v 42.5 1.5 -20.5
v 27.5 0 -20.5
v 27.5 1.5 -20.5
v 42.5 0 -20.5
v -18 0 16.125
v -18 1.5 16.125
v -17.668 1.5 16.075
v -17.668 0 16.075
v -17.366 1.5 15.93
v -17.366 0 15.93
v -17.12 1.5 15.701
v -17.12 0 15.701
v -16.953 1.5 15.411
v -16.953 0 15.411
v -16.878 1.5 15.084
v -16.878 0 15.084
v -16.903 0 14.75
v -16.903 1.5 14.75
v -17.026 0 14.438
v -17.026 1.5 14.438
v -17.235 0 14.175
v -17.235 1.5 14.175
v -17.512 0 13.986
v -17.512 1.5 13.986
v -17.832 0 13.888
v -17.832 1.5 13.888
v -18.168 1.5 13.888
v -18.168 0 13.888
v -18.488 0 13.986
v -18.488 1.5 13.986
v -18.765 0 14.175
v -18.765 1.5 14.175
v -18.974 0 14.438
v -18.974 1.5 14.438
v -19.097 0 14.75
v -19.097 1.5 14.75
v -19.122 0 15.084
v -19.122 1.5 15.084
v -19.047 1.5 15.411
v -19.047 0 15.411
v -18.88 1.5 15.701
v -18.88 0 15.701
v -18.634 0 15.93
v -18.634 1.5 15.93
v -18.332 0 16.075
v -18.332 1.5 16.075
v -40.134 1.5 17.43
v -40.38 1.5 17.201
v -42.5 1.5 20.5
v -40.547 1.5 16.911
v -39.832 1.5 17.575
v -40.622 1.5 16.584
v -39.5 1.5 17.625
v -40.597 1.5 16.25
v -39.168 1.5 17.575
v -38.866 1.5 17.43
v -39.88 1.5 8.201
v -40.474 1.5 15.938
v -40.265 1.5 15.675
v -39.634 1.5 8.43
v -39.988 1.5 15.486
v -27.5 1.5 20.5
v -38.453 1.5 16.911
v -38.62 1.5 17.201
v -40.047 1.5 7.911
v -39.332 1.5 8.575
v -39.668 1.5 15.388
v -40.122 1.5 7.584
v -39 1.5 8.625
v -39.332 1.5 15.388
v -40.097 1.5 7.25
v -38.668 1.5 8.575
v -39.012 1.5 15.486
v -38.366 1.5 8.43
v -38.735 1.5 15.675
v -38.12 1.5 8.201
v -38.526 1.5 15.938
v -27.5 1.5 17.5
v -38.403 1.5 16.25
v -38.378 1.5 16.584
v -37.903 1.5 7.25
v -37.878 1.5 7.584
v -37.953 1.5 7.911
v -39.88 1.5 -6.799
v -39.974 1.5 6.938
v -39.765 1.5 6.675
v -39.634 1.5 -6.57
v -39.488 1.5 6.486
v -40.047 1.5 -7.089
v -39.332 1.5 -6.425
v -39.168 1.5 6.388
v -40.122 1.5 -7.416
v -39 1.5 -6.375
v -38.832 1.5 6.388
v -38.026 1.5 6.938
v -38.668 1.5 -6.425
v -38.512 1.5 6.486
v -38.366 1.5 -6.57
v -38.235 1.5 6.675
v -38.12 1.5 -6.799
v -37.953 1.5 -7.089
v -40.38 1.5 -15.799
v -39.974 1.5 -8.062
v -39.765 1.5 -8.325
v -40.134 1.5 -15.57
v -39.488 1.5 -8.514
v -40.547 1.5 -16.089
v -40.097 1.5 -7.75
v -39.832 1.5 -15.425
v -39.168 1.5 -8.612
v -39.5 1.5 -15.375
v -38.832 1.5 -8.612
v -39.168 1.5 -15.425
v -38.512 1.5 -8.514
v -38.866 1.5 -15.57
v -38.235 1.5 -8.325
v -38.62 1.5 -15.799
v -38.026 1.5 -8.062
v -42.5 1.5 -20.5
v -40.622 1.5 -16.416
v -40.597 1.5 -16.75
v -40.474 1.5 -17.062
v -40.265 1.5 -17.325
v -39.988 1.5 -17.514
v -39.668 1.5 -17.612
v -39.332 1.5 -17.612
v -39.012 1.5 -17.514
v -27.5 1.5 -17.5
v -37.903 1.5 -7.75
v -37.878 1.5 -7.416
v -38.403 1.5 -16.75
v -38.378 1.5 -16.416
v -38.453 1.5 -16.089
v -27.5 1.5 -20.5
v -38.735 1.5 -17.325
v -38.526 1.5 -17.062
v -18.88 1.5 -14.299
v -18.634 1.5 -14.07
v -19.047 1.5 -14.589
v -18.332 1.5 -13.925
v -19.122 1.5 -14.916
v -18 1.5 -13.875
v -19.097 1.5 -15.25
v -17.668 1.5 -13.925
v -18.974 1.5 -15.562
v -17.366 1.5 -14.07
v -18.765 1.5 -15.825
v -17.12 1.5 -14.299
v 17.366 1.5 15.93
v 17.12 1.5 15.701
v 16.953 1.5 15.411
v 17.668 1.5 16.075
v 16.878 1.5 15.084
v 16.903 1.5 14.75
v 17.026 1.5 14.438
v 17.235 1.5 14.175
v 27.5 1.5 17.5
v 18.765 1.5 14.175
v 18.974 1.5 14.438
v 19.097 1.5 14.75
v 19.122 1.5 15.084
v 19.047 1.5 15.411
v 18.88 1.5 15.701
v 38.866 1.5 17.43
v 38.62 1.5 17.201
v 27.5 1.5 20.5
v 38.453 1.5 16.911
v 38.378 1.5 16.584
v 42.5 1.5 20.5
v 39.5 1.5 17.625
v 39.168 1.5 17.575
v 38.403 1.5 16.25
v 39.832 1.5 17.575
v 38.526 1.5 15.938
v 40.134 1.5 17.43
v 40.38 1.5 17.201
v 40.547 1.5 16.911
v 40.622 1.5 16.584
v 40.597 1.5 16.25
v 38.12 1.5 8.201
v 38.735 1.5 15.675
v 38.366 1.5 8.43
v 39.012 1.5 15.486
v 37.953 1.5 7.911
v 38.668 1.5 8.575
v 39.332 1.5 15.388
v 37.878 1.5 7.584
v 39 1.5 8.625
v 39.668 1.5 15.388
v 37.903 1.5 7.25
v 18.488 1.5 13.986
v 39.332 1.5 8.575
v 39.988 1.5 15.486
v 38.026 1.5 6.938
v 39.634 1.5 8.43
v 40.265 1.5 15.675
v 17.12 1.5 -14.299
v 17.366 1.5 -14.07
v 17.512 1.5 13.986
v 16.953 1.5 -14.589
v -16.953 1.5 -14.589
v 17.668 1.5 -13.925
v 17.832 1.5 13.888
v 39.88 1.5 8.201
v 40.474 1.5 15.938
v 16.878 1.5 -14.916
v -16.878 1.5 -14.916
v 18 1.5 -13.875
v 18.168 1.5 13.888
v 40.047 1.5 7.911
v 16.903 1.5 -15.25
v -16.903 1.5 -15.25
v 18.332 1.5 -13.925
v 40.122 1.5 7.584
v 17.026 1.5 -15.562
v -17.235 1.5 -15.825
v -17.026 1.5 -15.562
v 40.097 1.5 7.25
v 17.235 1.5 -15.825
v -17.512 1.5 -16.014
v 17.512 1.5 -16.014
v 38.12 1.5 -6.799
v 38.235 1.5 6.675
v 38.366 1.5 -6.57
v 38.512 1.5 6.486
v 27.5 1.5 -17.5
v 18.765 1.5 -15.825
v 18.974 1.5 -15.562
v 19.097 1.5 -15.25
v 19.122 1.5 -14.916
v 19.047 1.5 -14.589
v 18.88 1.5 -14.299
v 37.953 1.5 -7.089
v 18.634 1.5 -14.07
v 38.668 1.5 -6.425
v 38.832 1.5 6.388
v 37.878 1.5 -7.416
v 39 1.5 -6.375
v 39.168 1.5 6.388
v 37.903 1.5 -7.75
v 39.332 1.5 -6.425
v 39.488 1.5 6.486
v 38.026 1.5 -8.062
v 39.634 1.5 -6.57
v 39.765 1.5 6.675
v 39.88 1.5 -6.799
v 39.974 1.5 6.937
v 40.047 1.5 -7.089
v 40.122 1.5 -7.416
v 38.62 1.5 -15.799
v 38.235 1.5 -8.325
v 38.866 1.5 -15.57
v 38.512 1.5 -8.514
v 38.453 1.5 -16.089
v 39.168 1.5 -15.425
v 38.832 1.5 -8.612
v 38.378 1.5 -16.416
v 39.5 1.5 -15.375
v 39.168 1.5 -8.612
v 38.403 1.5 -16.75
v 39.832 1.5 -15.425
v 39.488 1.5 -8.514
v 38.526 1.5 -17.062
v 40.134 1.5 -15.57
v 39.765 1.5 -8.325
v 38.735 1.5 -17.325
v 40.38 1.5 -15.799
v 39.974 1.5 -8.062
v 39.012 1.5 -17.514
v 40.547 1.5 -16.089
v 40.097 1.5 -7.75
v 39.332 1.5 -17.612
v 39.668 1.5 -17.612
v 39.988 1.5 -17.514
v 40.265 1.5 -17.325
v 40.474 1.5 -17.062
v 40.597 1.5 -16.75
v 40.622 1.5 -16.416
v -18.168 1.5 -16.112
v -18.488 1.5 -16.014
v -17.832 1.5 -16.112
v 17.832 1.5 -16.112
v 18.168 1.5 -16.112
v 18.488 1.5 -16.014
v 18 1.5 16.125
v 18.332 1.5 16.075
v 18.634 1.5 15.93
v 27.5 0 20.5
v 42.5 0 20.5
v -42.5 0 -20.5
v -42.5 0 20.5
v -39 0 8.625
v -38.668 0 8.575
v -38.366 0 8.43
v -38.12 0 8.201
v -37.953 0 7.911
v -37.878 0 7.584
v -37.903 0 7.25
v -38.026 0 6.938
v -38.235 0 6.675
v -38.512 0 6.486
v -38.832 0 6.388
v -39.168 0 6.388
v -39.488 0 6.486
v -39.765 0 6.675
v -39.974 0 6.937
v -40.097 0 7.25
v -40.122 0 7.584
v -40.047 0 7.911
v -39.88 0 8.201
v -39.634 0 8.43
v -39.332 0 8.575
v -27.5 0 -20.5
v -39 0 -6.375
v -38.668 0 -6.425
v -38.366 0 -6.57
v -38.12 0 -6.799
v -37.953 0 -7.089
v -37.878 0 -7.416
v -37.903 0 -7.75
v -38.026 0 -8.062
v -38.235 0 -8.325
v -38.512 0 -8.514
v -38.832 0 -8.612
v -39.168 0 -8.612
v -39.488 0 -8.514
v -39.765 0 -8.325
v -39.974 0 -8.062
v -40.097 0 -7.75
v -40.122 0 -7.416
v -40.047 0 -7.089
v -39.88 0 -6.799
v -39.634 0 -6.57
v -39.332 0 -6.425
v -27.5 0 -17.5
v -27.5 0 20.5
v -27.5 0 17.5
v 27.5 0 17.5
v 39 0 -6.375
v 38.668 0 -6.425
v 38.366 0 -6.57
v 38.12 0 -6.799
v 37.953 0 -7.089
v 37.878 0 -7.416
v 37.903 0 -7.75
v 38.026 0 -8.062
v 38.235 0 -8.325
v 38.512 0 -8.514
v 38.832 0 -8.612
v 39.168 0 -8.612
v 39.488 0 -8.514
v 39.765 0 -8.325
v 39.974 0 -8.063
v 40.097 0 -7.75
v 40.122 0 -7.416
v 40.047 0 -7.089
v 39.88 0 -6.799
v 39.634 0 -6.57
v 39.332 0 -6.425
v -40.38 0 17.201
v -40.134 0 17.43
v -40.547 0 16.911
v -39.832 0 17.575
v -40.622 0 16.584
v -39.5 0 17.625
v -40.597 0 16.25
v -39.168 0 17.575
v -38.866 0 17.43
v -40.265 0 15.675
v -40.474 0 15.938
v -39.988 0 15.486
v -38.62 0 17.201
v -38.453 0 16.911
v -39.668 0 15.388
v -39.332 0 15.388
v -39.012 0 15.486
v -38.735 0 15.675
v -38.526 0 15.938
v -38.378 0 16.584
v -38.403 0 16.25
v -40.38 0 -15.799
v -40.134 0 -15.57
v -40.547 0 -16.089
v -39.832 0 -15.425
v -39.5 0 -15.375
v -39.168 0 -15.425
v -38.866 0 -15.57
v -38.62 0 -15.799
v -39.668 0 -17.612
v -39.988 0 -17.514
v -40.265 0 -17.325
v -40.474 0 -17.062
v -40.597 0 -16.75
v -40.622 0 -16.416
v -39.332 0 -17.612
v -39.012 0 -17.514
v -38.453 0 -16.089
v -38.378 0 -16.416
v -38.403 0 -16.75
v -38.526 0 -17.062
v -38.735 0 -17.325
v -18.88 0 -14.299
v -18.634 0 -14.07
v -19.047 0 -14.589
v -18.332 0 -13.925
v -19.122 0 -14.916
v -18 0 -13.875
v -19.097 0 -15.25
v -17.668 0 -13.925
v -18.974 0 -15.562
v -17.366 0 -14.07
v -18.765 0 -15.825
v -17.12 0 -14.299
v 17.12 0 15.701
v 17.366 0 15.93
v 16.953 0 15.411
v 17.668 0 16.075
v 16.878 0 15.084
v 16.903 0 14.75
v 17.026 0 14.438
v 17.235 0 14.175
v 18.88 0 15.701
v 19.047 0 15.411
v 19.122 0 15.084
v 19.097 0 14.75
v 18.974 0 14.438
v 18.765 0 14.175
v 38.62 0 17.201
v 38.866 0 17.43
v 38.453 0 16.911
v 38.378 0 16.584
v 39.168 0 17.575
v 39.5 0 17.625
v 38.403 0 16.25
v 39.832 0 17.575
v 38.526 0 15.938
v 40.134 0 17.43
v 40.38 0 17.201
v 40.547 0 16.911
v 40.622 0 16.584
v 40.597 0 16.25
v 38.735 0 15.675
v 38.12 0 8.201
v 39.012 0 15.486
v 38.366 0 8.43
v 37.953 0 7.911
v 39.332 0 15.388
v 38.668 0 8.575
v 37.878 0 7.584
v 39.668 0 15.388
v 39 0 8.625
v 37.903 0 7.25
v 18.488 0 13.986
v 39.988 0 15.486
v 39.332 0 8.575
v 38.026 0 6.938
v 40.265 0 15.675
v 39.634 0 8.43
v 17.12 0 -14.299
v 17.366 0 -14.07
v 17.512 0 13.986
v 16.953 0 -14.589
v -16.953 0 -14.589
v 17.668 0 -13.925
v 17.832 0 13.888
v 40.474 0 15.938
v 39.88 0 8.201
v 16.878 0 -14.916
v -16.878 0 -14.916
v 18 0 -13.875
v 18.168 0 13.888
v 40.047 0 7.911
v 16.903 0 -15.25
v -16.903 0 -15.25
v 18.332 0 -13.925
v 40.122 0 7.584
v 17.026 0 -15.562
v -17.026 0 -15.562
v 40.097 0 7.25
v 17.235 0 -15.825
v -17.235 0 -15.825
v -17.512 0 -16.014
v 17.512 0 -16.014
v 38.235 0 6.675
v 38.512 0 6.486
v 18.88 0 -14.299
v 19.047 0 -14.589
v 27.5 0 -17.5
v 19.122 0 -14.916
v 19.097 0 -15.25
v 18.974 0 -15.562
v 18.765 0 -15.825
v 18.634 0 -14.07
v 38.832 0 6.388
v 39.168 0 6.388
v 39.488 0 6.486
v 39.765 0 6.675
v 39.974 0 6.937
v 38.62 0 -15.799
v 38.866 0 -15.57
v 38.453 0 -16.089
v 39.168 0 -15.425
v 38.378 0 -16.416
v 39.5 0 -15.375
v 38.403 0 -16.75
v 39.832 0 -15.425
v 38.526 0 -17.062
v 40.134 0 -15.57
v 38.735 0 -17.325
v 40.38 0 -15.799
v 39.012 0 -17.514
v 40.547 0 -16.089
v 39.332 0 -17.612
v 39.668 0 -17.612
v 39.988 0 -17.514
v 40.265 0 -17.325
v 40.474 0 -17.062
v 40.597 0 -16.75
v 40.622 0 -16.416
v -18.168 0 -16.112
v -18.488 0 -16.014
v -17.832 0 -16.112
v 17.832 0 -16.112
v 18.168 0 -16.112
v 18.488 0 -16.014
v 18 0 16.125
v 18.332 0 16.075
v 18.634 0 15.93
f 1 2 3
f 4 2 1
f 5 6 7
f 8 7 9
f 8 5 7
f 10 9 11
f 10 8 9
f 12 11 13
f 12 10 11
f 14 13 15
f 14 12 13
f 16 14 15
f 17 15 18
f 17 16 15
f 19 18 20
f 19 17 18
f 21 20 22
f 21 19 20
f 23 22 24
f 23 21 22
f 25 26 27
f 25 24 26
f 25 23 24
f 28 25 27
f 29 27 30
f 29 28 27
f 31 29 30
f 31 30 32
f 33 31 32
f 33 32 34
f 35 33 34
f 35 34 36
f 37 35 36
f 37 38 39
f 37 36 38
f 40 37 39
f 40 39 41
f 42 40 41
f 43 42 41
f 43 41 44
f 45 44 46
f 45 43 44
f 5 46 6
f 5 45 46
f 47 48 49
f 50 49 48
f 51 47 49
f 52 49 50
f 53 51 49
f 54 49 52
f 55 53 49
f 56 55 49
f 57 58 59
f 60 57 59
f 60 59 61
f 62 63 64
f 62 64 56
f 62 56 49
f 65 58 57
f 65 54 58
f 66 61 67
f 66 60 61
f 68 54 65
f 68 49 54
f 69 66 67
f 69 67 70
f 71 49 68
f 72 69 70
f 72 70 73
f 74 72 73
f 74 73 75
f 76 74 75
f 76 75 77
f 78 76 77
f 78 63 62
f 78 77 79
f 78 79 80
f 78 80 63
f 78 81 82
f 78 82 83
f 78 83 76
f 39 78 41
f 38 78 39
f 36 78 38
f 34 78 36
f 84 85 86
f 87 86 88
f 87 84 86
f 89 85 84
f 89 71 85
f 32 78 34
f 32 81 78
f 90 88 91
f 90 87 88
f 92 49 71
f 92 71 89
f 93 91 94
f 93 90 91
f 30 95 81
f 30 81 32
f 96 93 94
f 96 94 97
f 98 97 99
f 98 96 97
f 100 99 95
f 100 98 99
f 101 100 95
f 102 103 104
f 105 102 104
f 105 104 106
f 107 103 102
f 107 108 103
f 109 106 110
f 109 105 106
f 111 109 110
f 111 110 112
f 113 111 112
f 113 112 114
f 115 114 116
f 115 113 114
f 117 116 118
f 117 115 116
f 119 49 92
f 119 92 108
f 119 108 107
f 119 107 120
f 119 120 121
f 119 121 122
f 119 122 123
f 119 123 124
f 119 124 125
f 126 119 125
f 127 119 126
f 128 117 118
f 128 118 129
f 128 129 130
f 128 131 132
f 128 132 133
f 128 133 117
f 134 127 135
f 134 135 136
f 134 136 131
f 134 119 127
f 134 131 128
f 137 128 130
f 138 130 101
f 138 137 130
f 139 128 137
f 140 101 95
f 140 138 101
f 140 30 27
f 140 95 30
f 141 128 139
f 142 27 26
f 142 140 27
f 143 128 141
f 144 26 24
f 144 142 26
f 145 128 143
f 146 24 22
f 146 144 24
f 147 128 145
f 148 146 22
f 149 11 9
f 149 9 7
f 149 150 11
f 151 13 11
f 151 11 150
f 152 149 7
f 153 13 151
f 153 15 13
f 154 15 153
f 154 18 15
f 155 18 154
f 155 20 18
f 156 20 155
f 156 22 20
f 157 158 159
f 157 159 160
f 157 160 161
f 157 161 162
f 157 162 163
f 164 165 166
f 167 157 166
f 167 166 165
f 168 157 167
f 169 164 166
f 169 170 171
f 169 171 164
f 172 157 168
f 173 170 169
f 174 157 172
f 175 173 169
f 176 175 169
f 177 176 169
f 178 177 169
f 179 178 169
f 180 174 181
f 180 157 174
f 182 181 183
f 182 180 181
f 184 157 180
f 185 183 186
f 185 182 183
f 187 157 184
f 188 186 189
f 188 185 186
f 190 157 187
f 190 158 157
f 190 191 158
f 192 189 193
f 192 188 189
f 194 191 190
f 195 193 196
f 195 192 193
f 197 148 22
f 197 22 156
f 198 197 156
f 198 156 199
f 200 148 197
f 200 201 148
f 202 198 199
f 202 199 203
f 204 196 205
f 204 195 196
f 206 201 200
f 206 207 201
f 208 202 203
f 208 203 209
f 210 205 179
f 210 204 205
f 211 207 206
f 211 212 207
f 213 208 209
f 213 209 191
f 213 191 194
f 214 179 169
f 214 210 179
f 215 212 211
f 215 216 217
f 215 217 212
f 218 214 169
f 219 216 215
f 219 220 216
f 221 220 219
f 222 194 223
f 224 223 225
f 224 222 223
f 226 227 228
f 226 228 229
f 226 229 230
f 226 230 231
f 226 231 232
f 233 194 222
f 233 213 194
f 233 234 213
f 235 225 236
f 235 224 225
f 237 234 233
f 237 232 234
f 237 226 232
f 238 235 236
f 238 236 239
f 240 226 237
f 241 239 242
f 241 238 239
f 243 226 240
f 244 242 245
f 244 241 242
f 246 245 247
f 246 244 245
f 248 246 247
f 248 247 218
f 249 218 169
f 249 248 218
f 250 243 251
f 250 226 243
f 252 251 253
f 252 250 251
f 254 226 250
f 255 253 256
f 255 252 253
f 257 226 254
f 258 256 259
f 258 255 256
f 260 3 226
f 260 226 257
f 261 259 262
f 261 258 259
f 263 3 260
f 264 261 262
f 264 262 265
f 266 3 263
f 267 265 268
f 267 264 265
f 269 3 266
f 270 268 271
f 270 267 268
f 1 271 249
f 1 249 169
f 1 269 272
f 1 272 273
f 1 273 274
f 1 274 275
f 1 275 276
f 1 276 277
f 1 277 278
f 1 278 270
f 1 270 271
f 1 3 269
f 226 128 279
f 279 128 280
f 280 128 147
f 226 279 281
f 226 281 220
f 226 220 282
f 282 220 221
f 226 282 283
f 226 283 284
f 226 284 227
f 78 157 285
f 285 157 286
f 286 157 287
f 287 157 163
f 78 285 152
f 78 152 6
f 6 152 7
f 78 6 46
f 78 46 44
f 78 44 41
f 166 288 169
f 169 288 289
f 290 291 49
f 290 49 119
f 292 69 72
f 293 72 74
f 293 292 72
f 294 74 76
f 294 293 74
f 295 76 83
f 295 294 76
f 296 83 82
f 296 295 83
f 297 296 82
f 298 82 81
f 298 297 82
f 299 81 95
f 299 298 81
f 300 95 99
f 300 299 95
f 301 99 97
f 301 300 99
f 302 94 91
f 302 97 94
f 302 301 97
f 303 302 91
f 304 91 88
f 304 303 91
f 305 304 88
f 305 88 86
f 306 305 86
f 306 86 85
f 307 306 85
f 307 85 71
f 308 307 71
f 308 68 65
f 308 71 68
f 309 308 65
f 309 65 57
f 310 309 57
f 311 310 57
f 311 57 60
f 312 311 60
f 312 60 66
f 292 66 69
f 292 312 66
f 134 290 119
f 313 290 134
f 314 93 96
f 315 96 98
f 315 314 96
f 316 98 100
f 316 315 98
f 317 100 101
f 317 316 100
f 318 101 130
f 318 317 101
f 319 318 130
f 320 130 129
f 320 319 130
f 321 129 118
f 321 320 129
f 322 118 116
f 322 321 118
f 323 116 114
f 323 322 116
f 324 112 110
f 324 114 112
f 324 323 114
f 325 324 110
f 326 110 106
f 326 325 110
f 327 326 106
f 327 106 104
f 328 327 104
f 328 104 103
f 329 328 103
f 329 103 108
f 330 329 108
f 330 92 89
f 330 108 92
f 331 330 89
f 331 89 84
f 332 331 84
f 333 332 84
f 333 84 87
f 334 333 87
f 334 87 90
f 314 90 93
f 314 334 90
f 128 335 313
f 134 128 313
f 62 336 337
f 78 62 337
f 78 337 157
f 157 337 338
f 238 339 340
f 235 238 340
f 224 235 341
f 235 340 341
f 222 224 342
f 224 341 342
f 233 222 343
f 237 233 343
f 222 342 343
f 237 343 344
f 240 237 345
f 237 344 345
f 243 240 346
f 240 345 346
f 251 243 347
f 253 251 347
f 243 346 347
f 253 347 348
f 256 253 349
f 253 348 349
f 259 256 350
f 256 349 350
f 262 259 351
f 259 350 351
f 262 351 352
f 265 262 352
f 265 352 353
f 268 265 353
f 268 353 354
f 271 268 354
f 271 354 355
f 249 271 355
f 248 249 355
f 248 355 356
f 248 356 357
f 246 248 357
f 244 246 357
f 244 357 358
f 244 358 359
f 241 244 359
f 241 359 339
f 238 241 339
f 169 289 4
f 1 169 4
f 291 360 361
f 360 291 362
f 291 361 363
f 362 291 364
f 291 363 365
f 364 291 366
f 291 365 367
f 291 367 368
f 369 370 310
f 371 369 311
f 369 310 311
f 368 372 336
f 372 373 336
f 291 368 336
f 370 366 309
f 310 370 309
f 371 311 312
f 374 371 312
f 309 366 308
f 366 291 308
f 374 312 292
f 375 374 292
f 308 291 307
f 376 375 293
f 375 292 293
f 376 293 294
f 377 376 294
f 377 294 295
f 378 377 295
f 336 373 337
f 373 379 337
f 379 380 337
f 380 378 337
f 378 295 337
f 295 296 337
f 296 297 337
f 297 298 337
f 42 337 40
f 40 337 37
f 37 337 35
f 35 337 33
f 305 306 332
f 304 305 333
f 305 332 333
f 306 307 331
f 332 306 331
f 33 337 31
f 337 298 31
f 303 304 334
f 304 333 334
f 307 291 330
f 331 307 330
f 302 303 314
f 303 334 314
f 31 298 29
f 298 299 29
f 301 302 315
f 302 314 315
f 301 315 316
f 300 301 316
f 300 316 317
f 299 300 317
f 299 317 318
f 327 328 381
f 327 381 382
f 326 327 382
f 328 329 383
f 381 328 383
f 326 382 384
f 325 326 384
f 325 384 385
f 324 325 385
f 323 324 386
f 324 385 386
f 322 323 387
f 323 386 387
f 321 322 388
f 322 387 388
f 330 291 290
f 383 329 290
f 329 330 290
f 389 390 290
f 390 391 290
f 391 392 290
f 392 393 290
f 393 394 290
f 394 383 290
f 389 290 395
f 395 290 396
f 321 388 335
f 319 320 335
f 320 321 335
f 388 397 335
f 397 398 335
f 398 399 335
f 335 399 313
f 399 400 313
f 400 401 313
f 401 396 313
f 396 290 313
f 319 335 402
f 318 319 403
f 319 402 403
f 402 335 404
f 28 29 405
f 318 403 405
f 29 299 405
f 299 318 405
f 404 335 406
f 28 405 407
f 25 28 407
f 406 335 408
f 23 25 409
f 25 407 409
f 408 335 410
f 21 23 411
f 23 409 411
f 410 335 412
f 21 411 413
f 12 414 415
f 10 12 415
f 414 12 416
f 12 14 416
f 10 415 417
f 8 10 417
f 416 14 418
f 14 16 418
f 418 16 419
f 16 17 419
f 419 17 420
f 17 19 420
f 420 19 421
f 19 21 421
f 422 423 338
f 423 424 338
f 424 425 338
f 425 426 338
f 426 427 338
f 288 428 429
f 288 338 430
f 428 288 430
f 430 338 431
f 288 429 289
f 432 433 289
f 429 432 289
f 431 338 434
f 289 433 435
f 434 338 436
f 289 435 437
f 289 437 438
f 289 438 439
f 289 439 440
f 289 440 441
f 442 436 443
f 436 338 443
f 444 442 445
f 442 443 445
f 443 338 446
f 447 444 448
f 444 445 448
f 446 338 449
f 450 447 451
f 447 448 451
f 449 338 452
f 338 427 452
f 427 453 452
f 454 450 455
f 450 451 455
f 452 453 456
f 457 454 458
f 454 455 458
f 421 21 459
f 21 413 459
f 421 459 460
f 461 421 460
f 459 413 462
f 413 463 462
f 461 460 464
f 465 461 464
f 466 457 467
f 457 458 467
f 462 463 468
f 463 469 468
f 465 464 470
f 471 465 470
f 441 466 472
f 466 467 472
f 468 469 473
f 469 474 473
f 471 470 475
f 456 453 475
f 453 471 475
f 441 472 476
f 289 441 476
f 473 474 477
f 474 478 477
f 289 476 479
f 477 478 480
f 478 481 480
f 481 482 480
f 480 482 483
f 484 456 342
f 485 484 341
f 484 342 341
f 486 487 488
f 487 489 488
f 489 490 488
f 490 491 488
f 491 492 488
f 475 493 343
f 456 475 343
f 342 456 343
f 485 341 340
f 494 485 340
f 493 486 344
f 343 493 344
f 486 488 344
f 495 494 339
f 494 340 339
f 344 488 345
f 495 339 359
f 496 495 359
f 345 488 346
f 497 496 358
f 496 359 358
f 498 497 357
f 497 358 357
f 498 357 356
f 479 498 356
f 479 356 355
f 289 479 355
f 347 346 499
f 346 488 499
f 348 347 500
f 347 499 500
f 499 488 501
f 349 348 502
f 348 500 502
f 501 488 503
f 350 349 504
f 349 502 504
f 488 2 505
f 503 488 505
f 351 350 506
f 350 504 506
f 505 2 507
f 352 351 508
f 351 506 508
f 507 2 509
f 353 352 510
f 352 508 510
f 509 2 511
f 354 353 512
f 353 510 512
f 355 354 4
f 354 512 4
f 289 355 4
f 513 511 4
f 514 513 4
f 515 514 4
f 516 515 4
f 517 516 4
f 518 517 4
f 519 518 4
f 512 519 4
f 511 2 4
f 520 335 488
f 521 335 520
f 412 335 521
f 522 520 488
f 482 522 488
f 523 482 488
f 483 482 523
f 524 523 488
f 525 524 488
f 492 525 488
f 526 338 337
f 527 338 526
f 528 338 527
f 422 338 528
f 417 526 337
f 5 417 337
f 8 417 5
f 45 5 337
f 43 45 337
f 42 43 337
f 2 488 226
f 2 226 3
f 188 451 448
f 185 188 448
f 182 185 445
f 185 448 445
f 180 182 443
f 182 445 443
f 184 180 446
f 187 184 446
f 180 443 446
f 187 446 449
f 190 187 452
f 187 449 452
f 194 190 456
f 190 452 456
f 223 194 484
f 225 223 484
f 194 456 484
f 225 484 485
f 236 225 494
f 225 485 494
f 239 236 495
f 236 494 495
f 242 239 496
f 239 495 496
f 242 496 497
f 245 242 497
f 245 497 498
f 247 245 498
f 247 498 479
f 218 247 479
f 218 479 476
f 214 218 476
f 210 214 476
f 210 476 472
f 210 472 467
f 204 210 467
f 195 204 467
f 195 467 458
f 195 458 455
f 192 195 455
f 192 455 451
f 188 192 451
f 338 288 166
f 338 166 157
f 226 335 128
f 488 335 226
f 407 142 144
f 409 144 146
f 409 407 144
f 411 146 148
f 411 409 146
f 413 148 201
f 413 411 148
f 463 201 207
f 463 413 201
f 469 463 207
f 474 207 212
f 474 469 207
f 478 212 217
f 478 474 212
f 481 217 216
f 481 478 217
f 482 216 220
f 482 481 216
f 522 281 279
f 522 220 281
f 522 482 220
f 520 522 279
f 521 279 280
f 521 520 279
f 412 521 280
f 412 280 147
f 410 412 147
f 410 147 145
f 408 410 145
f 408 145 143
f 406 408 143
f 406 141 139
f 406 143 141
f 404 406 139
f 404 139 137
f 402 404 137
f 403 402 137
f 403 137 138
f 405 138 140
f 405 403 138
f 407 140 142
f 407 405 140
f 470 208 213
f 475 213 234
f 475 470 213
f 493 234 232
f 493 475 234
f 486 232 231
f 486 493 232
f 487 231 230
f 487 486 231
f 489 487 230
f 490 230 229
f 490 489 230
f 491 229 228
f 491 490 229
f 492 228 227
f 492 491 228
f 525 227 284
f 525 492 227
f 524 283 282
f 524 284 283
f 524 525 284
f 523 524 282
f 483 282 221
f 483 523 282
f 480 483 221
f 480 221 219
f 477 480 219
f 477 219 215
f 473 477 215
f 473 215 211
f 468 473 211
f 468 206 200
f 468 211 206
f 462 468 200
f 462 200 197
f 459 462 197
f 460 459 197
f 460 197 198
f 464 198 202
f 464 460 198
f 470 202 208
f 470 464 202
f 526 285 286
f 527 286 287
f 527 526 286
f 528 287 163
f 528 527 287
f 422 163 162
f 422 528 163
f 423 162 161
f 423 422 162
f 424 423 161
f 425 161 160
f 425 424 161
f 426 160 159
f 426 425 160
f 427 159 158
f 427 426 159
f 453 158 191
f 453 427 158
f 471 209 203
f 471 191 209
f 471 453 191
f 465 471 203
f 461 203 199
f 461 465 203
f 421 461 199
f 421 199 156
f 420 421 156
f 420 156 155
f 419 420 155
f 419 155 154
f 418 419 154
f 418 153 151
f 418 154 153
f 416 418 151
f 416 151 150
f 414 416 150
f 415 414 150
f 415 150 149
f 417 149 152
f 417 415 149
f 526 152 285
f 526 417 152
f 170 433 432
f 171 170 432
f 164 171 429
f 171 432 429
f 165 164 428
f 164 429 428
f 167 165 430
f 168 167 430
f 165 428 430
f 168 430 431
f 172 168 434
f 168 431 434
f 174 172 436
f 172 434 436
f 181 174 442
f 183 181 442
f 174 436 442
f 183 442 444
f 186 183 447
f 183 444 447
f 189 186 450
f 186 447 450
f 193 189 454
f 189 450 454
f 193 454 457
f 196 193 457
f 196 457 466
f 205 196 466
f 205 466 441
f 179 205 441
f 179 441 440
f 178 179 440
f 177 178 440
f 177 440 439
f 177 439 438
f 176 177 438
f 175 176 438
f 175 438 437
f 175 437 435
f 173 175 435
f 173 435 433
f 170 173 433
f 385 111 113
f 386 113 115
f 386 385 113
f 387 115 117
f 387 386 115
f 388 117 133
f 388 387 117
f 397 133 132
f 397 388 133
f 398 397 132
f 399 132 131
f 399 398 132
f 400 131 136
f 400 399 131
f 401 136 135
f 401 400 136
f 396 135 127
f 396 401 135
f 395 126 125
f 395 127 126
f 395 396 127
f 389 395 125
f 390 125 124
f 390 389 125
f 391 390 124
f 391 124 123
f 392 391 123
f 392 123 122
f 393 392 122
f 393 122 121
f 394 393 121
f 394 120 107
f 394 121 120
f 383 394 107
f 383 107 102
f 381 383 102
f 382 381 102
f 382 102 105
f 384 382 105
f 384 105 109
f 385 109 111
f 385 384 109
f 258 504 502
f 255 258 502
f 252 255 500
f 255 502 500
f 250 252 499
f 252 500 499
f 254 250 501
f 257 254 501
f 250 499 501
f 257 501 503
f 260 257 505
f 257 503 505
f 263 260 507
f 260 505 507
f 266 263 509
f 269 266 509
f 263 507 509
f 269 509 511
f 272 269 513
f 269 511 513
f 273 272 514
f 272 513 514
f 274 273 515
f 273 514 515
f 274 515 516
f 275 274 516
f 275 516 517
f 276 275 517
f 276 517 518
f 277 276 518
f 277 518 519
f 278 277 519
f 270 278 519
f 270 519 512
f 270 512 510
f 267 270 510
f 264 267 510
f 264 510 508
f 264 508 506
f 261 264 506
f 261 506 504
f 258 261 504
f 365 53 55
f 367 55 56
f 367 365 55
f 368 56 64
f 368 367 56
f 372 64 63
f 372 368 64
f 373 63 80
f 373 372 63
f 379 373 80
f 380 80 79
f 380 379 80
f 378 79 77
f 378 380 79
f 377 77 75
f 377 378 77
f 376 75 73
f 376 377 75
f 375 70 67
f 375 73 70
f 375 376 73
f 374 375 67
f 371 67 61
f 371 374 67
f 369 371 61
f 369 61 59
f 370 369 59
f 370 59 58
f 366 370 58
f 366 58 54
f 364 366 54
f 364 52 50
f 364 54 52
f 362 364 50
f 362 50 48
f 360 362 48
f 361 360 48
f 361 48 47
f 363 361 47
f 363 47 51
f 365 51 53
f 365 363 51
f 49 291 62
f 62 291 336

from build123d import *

# Parameters (mm, degrees)
SKETCH1_W           = 55
SKETCH1_H           = 35
BOSS_EXTRUDE1_DEPTH = 1.5
SKETCH2_W           = 15
SKETCH2_H           = 41
BOSS_EXTRUDE2_DEPTH = 1.5
SKETCH3_R           = 1.125
CUT_EXTRUDE1_DEPTH  = 10


with BuildPart() as part:
    # Sketch1 → Boss-Extrude1 (new body)
    with BuildSketch(Plane(origin=(0, 0, 0), x_dir=(1, 0, 0), z_dir=(0, 1, 0))):
        Rectangle(SKETCH1_W, SKETCH1_H)
    extrude(amount=BOSS_EXTRUDE1_DEPTH)

    # Sketch2 → Boss-Extrude2 (add)
    with BuildSketch(Plane(origin=(0, 0, 0), x_dir=(1, 0, 0), z_dir=(0, 1, 0))):
        with Locations((35, 0)):
            Rectangle(SKETCH2_W, SKETCH2_H)
        with Locations((-35, 0)):
            Rectangle(SKETCH2_W, SKETCH2_H)
    extrude(amount=BOSS_EXTRUDE2_DEPTH)

    # Sketch3 → Cut-Extrude1 (cut)
    with BuildSketch(Plane(origin=(0, 0, 0), x_dir=(1, 0, 0), z_dir=(0, 1, 0))):
        with Locations(Location((-39.5, -16.5, 0), (0, 0, 270))):
            Circle(SKETCH3_R)
        with Locations(Location((-39, -7.5, 0), (0, 0, 270))):
            Circle(SKETCH3_R)
        with Locations(Location((-39, 7.5, 0), (0, 0, 270))):
            Circle(SKETCH3_R)
        with Locations(Location((-39.5, 16.5, 0), (0, 0, 270))):
            Circle(SKETCH3_R)
        with Locations(Location((-18, 15, 0), (0, 0, 270))):
            Circle(SKETCH3_R)
        with Locations(Location((18, 15, 0), (0, 0, 270))):
            Circle(SKETCH3_R)
        with Locations(Location((-18, -15, 0), (0, 0, 270))):
            Circle(SKETCH3_R)
        with Locations(Location((18, -15, 0), (0, 0, 270))):
            Circle(SKETCH3_R)
    cut_extrude1 = extrude(amount=CUT_EXTRUDE1_DEPTH, mode=Mode.SUBTRACT)

    # Mirror1: Cut-Extrude1 across plane
    add(cut_extrude1.mirror(Plane(origin=(0, 0, 0), x_dir=(0, 0, 1), z_dir=(1, 0, 0))), mode=Mode.SUBTRACT)


solid = part.part
